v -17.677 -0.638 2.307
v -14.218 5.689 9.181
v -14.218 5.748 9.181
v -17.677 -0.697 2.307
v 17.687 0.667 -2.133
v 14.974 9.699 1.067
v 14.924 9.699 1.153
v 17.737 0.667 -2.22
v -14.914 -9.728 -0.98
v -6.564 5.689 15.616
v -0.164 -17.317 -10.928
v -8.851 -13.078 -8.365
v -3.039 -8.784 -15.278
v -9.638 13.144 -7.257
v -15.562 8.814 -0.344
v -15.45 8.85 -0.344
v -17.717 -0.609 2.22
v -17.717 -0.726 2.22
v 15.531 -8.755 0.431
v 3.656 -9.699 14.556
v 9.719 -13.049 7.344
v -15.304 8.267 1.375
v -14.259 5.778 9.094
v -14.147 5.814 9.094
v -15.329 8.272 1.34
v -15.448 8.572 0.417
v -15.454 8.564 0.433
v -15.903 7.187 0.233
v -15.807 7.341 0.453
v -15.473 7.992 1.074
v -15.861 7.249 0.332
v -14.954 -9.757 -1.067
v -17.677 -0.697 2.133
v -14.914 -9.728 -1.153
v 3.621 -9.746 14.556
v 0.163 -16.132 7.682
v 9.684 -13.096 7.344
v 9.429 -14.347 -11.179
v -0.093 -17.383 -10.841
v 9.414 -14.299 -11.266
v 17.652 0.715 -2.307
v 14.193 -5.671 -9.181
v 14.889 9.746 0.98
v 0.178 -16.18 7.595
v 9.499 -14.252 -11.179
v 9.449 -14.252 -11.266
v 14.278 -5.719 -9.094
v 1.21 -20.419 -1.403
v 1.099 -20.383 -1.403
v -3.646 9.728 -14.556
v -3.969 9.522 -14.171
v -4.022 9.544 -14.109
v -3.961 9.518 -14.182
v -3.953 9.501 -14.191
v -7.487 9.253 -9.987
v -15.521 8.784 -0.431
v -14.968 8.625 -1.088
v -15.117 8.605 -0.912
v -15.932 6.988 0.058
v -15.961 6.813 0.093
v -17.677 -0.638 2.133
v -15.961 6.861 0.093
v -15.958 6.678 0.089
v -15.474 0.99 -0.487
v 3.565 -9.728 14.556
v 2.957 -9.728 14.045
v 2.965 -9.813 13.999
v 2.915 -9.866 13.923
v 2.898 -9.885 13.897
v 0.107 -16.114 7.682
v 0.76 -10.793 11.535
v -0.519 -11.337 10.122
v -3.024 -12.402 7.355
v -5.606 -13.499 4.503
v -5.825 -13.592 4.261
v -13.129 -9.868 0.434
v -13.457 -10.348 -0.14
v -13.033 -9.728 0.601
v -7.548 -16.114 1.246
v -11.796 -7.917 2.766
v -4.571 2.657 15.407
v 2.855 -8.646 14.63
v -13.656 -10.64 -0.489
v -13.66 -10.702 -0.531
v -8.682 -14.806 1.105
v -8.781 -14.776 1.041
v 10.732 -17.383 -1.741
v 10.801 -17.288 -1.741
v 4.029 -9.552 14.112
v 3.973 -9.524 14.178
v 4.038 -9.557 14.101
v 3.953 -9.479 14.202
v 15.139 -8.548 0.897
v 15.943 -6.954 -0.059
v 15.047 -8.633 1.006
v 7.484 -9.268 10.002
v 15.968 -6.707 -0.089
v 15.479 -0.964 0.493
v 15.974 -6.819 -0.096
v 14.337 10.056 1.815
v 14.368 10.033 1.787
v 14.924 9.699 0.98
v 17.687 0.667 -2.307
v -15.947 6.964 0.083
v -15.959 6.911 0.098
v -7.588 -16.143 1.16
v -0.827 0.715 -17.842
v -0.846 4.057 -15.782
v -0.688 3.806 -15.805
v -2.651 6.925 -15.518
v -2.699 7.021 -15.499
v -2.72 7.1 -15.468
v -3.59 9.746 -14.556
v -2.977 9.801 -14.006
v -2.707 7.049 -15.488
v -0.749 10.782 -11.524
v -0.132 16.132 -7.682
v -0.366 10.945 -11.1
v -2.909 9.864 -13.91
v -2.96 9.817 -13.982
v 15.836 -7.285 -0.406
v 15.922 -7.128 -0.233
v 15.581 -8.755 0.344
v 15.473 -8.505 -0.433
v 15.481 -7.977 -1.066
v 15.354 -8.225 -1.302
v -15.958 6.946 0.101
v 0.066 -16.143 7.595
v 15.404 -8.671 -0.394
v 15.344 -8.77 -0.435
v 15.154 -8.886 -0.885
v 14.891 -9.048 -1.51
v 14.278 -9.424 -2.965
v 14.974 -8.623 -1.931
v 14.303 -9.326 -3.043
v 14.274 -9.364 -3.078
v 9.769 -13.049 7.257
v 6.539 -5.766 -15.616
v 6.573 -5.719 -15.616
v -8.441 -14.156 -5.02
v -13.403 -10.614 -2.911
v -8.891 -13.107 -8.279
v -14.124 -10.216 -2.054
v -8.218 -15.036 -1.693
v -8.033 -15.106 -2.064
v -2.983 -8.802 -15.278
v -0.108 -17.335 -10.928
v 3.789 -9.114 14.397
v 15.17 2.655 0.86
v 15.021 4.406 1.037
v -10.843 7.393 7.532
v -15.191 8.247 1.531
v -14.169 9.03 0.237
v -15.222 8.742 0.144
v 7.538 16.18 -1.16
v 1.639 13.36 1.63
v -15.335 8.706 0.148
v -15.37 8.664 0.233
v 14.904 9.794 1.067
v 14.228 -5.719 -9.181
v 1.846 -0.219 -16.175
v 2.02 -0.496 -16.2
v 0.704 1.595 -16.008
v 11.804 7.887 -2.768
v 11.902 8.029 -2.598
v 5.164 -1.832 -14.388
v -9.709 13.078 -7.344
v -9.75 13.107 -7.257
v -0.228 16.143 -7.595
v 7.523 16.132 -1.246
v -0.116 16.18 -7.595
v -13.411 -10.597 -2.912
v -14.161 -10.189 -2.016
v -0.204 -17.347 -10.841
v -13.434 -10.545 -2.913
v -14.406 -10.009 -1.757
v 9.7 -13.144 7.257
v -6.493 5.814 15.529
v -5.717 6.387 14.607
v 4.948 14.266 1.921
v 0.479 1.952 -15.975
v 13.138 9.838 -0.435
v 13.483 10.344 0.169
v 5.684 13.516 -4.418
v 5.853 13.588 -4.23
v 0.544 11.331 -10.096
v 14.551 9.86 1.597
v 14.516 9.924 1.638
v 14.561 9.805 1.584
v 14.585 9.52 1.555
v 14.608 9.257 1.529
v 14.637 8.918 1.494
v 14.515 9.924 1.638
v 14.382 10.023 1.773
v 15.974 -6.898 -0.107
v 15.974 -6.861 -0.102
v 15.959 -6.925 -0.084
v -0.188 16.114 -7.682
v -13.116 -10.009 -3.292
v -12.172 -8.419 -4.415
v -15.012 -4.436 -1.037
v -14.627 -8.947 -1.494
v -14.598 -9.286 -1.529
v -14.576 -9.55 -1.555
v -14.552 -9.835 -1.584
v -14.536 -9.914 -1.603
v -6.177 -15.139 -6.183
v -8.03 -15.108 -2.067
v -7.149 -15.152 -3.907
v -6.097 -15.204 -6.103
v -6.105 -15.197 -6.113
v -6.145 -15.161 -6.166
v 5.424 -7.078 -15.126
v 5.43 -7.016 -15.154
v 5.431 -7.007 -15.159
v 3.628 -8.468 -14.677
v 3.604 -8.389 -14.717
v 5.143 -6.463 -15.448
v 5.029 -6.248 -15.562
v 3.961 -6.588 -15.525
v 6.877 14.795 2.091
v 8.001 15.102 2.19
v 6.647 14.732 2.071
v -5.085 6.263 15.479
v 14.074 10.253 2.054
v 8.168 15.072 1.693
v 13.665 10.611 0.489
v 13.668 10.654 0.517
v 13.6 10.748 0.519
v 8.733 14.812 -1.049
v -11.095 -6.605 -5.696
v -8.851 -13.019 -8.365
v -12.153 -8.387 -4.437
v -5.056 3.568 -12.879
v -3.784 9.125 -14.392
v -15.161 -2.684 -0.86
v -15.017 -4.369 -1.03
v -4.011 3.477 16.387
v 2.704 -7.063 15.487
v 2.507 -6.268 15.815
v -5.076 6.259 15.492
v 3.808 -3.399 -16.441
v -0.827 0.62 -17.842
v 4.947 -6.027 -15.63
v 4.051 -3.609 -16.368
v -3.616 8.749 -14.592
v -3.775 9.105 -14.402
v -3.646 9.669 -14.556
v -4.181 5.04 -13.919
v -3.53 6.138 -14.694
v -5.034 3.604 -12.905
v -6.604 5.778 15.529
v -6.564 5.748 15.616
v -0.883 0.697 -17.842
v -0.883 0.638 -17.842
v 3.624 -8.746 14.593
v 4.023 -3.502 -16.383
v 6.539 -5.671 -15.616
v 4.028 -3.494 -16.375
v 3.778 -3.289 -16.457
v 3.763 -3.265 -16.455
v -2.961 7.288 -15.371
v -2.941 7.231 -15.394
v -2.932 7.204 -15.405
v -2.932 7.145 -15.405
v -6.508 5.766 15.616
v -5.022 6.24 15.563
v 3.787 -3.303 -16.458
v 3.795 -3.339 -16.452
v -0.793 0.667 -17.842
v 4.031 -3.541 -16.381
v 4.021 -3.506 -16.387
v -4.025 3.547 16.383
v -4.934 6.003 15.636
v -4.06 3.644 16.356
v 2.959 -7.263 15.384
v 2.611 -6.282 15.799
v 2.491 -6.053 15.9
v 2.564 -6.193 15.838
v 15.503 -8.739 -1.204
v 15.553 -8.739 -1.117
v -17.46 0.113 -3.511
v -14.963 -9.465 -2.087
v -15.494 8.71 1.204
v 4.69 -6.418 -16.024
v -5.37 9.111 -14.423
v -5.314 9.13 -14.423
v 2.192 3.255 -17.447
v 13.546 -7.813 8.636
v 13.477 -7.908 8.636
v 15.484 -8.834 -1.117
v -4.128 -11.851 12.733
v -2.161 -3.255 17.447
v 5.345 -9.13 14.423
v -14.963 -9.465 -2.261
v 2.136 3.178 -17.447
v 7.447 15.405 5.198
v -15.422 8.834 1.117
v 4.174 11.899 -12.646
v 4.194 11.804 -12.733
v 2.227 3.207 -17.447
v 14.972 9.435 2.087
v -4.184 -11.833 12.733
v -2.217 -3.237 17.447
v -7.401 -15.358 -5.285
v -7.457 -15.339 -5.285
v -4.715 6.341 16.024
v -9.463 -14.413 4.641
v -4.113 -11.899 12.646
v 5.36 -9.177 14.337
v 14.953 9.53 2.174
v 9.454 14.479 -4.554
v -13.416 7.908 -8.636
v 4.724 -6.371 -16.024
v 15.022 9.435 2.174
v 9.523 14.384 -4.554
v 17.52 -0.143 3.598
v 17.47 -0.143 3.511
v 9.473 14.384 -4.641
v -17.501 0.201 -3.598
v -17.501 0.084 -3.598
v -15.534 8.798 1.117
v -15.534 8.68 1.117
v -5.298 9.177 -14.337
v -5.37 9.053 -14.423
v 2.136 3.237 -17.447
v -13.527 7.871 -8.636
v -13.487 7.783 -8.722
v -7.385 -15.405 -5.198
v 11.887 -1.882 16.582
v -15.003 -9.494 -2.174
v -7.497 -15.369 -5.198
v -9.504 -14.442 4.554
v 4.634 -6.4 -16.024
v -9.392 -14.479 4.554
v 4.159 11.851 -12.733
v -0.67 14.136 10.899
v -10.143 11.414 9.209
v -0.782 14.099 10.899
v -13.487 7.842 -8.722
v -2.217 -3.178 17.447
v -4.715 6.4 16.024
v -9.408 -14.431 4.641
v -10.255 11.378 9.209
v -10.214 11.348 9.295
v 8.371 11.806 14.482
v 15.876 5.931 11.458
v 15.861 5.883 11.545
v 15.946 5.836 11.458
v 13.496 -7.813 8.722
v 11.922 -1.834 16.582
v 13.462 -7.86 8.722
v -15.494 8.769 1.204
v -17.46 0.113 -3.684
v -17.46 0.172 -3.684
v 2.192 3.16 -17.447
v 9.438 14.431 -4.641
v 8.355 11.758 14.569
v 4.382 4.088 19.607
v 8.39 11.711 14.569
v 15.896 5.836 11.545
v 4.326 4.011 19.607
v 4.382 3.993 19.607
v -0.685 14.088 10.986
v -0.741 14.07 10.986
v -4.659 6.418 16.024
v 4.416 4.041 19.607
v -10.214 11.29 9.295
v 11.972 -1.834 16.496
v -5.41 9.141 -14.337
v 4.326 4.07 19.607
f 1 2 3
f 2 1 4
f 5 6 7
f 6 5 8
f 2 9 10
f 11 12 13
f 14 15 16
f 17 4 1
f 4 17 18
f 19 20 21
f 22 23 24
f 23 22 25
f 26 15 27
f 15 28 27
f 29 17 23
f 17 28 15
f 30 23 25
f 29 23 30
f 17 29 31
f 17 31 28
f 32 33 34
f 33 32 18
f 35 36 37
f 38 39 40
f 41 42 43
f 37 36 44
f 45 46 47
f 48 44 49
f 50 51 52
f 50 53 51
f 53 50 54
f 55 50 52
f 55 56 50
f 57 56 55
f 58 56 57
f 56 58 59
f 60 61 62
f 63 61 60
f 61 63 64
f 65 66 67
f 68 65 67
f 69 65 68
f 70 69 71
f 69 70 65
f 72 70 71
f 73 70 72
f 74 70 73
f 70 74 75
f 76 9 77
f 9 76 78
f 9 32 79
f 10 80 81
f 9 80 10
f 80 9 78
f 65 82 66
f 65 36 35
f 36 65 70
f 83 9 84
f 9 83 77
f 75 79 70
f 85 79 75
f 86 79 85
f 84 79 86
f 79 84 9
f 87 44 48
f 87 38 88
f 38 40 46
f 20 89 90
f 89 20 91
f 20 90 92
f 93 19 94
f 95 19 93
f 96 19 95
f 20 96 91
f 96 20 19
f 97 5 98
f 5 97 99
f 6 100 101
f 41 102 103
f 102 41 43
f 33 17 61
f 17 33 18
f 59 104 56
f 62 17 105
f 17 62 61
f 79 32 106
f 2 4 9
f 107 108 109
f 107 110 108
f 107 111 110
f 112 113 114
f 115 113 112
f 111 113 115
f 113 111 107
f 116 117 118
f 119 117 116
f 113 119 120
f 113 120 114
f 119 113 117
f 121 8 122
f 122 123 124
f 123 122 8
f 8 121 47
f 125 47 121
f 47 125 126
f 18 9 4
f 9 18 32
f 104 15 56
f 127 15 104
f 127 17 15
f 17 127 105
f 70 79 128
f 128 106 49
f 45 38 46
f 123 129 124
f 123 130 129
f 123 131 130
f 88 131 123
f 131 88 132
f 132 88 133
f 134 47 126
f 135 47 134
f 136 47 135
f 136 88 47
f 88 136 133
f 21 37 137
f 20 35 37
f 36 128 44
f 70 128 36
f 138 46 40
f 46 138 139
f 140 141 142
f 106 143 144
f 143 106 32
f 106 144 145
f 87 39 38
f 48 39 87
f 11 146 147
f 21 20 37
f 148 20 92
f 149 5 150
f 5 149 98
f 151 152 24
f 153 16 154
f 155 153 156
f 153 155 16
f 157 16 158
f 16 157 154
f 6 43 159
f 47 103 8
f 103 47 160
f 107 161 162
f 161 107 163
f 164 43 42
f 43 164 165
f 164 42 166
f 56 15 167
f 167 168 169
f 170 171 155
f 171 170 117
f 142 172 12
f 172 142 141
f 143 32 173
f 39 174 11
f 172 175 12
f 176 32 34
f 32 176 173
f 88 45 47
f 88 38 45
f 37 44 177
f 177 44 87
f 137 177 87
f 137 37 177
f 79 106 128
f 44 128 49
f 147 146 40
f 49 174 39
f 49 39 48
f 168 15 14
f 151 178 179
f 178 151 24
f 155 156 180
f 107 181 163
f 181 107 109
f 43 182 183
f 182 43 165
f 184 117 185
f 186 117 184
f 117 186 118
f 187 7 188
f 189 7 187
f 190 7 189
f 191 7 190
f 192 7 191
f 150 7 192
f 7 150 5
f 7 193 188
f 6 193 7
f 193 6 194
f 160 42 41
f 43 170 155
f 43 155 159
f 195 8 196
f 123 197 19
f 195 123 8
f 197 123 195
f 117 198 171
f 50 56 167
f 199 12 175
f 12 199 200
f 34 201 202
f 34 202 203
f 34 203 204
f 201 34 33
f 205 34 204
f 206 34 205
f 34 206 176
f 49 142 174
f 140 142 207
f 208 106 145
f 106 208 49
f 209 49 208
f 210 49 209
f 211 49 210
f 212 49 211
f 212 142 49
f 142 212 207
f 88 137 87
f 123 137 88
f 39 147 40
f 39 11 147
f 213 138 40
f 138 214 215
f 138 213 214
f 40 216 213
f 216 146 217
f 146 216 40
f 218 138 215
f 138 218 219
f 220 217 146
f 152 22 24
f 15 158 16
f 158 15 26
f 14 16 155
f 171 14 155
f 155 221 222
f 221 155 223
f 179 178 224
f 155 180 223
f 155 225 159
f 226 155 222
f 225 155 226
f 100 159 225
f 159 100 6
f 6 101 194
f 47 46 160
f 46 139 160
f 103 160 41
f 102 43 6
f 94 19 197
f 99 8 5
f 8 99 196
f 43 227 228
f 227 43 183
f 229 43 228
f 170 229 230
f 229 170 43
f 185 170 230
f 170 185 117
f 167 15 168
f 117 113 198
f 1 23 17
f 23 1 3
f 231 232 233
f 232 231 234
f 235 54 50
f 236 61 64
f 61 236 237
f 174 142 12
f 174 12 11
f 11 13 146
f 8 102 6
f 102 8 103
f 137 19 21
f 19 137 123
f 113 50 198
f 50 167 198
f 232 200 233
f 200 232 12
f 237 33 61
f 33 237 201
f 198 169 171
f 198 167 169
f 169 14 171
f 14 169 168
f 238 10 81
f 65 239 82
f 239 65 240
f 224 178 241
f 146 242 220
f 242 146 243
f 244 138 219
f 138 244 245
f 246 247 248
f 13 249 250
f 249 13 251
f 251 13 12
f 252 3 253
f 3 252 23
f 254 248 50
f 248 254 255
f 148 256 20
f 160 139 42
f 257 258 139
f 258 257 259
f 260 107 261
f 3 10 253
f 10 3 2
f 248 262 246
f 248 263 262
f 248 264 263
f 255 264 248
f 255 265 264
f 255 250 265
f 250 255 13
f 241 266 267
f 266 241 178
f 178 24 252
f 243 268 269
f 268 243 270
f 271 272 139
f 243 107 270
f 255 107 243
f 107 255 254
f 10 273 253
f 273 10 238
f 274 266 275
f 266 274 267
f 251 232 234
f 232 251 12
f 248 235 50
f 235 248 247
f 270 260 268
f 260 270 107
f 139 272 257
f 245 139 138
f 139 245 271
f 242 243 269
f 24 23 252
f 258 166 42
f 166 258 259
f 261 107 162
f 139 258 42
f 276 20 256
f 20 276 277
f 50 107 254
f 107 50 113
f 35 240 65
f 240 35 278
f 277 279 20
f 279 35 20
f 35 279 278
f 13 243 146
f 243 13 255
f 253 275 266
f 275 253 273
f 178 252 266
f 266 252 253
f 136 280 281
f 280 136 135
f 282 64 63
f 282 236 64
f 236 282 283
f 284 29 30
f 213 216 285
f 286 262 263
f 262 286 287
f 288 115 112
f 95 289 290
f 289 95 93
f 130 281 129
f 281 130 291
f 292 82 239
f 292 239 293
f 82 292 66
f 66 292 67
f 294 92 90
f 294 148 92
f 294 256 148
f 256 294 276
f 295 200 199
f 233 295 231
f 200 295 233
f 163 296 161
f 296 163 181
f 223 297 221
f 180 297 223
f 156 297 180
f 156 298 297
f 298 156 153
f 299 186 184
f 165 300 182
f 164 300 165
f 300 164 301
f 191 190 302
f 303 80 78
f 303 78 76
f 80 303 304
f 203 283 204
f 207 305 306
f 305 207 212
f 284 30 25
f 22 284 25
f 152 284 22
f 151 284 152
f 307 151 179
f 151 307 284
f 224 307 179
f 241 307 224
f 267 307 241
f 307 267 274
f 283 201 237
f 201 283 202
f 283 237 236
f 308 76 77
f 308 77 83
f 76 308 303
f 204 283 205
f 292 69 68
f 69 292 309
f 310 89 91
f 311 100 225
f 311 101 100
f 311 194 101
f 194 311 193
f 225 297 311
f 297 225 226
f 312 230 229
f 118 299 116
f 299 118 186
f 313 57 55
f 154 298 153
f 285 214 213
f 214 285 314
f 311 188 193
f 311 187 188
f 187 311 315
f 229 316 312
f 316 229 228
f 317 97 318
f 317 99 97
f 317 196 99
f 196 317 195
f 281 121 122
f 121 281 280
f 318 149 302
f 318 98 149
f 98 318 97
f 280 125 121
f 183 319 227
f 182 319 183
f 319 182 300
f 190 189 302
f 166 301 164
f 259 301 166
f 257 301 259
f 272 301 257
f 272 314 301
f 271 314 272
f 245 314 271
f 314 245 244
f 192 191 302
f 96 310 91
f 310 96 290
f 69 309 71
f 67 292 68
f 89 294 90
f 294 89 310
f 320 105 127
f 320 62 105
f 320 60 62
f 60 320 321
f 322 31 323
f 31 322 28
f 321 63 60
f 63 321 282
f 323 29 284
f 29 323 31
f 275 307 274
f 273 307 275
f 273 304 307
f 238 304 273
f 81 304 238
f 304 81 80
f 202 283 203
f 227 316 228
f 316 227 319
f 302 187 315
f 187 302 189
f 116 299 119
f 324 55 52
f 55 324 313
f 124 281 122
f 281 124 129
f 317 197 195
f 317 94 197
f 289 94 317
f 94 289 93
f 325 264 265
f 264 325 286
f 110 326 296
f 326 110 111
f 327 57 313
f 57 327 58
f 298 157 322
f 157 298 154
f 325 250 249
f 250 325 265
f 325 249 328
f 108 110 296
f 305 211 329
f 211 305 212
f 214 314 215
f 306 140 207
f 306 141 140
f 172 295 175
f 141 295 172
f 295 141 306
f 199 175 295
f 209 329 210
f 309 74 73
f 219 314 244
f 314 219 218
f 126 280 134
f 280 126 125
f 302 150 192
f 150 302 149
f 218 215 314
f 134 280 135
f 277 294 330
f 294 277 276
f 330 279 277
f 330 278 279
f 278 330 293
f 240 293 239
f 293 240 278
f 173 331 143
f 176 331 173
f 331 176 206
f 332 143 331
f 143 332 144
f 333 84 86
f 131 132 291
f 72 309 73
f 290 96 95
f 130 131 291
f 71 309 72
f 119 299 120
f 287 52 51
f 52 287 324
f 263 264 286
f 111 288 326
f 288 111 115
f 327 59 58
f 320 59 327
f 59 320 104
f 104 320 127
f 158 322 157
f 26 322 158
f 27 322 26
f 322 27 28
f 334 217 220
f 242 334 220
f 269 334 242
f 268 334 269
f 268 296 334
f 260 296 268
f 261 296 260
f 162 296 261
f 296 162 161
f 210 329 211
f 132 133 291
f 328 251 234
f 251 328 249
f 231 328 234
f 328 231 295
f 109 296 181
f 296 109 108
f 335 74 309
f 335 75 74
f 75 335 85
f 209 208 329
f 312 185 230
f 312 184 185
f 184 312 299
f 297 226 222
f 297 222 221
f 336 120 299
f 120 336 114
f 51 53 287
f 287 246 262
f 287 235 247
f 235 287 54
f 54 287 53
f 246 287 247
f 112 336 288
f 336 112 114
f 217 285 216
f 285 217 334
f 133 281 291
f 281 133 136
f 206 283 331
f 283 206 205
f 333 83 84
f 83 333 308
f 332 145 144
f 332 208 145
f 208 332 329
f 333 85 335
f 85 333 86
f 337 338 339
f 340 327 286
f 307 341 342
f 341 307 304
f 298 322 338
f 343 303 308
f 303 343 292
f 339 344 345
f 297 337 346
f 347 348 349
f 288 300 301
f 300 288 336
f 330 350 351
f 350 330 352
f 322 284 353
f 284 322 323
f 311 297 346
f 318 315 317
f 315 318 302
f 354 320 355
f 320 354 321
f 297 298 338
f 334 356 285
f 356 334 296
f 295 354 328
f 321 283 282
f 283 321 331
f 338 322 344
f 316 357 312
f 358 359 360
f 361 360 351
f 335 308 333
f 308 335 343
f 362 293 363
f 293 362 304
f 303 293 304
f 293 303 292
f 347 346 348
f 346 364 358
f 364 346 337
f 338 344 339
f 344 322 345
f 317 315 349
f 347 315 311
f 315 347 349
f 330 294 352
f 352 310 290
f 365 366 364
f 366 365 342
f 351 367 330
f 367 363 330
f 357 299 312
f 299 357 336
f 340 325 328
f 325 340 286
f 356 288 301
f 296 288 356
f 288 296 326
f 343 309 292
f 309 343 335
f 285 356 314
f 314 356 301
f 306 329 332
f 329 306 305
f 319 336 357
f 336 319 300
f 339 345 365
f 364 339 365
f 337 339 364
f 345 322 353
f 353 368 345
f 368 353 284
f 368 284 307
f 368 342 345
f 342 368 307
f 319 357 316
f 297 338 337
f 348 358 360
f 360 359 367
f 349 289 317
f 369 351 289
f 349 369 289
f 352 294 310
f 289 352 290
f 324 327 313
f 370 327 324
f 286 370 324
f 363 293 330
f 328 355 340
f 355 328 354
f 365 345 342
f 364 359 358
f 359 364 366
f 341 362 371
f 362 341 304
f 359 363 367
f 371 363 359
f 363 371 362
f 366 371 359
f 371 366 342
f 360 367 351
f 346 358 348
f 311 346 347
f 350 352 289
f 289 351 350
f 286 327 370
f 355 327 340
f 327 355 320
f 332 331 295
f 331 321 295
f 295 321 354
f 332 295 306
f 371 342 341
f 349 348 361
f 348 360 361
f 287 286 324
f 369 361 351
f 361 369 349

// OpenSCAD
// Auto-generated OpenSCAD file

    inner_points = 10*[[-0.21767207125666155, -0.32071847091711014, 1.7360795183920927], [-1.4922229350476093, -0.9435162185789954, -0.21739691757103918], [-0.46744991045730744, 0.6370588317477957, 1.5936938816719737], [-1.7420007742482555, 0.014261084085910432, -0.35978255429115813], [1.7420007742482542, -0.014261084085911972, 0.35978255429115813], [0.4674499104573061, -0.6370588317477972, -1.5936938816719737], [1.492222935047608, 0.9435162185789938, 0.21739691757103918], [0.21767207125666022, 0.3207184709171086, -1.7360795183920927], [-0.4143597724049588, -1.1803825334804832, 1.2646013664549804], [-0.942296026121513, -1.4383538071774526, 0.4554449329027941], [-1.017376819383404, 1.131896420346253, 0.9208520311981405], [-1.545313073099958, 0.8739251466492834, 0.11169559764595427], [1.5453130730999567, -0.873925146649285, -0.11169559764595427], [1.0173768193834027, -1.1318964203462543, -0.9208520311981405], [0.9422960261215116, 1.4383538071774513, -0.4554449329027941], [0.41435977240495747, 1.1803825334804818, -1.2646013664549804], [0.5329224201734905, -0.9082100060398764, 1.4336533198017478], [-0.7416284436174575, -1.5310077537017615, -0.5198231161613842], [-0.07009462680495482, 1.4040689477868598, 1.089903984544908], [-1.3446454905959027, 0.7812712001249748, -0.8635724514182238], [1.3446454905959013, -0.7812712001249763, 0.8635724514182238], [0.07009462680495349, -1.404068947786861, -1.089903984544908], [0.7416284436174562, 1.5310077537017601, 0.5198231161613842], [-0.5329224201734918, 0.9082100060398749, -1.4336533198017478], [0.43660784939141806, 0.40405282035525075, 1.9520062670457445], [1.584557624473923, 0.5835714012715488, 1.1457901713283336], [1.1872023408215704, -0.18343871476751553, 1.6495800684553996], [0.8339631330437706, 1.1710629363943152, 1.4482163699186787]];

    outer_points = 10*[[-0.2998492432811004, -0.8754891635864159, -1.5191519733455254], [-0.9669049177063294, 1.3048578449672972, -0.7257096161108192], [-0.8810229625548427, -1.3048578449672972, -0.8278635794933151], [-1.5480786369800716, 0.8754891635864159, -0.034421222258608775], [1.5480786369800716, -0.8754891635864159, 0.034421222258608775], [0.8810229625548427, 1.3048578449672972, 0.8278635794933151], [0.9669049177063294, -1.3048578449672972, 0.7257096161108192], [0.2998492432811004, 0.8754891635864159, 1.5191519733455254], [-0.084273448945414, 0.0667291961127105, -1.775572798440574], [-0.36057695615027563, 0.9698584977352651, -1.4469182131126805], [-1.4873509241108964, -0.9698584977352651, -0.10665498249145389], [-1.763654431315758, -0.0667291961127105, 0.2219996028364397], [1.763654431315758, 0.0667291961127105, -0.2219996028364397], [1.4873509241108964, 0.9698584977352651, 0.10665498249145389], [0.36057695615027563, -0.9698584977352651, 1.4469182131126805], [0.084273448945414, -0.0667291961127105, 1.775572798440574], [0.6523481796495847, -0.5718796573528687, -1.5529356304711843], [-0.01470749477564448, 1.6084673512008445, -0.7594932732364776], [-0.7507292955158978, -1.6084673512008445, 0.11598218547793598], [-1.417784969941127, 0.5718796573528687, 0.9094245427126425], [1.417784969941127, -0.5718796573528687, -0.9094245427126425], [0.7507292955158978, 1.6084673512008445, -0.11598218547793598], [0.01470749477564448, -1.6084673512008445, 0.7594932732364776], [-0.6523481796495847, 0.5718796573528687, 1.5529356304711843], [-0.012341624162016562, -1.728782357742436, -1.0841461184935561], [1.0701494658076132, -1.728782357742436, -0.17408401064796336], [0.9398557987686684, -1.4251728515088886, -1.1179297756192146], [0.11795204287692822, -2.0323918639759833, -0.1403003535223048]];

    // Convex hull for inner set (I)
    module inner_hull() {
        hull() {
            for (p = inner_points) {
                translate(p) sphere(r=0.1);
            }
        }
    }

    // Convex hull for outer set (O) minus inner hull (O \ I)
    module outer_minus_inner() {
        difference() {
            hull() {
                for (p = outer_points) {
                    translate(p) sphere(r=0.1);
                }
            }
            inner_hull(); // Subtract inner hull
        }
    }

    // Convex hull for outer set (O) minus all translated inner hulls
    module outer_minus_AllTranslationInner() {
        difference() {
            hull() {
                for (p = outer_points) {
                    translate(p) sphere(r=0.1);
                }
            }
            hull() {
                translate([0,0,50]) inner_hull();
                translate([0,0,-50]) inner_hull();
            }; // Subtract translated inner hulls
        }
    }

    // Difference between outer_minus_inner and outer_minus_AllTranslationInner
    module outer_minus_inner_diff() {
        difference() {
            // Outer minus inner
            difference() {
                hull() {
                    for (p = outer_points) {
                        translate(p) sphere(r=0.1);
                    }
                }
                inner_hull();
            }

            // Subtract Outer minus AllTranslationInner
            difference() {
                hull() {
                    for (p = outer_points) {
                        translate(p) sphere(r=0.1);
                    }
                }
                hull() {
                    translate([0,0,50]) inner_hull();
                    translate([0,0,-50]) inner_hull();
                };
            }
        }
    }

    // Rendering all with colors applied
    color([1, 0, 0, 0.5]) inner_hull(); // Transparent red
    color([0, 1, 0, 1]) outer_minus_AllTranslationInner(); // Opaque green
    color([1, 1, 0, 1]) outer_minus_inner_diff(); // Opaque yellow
    
